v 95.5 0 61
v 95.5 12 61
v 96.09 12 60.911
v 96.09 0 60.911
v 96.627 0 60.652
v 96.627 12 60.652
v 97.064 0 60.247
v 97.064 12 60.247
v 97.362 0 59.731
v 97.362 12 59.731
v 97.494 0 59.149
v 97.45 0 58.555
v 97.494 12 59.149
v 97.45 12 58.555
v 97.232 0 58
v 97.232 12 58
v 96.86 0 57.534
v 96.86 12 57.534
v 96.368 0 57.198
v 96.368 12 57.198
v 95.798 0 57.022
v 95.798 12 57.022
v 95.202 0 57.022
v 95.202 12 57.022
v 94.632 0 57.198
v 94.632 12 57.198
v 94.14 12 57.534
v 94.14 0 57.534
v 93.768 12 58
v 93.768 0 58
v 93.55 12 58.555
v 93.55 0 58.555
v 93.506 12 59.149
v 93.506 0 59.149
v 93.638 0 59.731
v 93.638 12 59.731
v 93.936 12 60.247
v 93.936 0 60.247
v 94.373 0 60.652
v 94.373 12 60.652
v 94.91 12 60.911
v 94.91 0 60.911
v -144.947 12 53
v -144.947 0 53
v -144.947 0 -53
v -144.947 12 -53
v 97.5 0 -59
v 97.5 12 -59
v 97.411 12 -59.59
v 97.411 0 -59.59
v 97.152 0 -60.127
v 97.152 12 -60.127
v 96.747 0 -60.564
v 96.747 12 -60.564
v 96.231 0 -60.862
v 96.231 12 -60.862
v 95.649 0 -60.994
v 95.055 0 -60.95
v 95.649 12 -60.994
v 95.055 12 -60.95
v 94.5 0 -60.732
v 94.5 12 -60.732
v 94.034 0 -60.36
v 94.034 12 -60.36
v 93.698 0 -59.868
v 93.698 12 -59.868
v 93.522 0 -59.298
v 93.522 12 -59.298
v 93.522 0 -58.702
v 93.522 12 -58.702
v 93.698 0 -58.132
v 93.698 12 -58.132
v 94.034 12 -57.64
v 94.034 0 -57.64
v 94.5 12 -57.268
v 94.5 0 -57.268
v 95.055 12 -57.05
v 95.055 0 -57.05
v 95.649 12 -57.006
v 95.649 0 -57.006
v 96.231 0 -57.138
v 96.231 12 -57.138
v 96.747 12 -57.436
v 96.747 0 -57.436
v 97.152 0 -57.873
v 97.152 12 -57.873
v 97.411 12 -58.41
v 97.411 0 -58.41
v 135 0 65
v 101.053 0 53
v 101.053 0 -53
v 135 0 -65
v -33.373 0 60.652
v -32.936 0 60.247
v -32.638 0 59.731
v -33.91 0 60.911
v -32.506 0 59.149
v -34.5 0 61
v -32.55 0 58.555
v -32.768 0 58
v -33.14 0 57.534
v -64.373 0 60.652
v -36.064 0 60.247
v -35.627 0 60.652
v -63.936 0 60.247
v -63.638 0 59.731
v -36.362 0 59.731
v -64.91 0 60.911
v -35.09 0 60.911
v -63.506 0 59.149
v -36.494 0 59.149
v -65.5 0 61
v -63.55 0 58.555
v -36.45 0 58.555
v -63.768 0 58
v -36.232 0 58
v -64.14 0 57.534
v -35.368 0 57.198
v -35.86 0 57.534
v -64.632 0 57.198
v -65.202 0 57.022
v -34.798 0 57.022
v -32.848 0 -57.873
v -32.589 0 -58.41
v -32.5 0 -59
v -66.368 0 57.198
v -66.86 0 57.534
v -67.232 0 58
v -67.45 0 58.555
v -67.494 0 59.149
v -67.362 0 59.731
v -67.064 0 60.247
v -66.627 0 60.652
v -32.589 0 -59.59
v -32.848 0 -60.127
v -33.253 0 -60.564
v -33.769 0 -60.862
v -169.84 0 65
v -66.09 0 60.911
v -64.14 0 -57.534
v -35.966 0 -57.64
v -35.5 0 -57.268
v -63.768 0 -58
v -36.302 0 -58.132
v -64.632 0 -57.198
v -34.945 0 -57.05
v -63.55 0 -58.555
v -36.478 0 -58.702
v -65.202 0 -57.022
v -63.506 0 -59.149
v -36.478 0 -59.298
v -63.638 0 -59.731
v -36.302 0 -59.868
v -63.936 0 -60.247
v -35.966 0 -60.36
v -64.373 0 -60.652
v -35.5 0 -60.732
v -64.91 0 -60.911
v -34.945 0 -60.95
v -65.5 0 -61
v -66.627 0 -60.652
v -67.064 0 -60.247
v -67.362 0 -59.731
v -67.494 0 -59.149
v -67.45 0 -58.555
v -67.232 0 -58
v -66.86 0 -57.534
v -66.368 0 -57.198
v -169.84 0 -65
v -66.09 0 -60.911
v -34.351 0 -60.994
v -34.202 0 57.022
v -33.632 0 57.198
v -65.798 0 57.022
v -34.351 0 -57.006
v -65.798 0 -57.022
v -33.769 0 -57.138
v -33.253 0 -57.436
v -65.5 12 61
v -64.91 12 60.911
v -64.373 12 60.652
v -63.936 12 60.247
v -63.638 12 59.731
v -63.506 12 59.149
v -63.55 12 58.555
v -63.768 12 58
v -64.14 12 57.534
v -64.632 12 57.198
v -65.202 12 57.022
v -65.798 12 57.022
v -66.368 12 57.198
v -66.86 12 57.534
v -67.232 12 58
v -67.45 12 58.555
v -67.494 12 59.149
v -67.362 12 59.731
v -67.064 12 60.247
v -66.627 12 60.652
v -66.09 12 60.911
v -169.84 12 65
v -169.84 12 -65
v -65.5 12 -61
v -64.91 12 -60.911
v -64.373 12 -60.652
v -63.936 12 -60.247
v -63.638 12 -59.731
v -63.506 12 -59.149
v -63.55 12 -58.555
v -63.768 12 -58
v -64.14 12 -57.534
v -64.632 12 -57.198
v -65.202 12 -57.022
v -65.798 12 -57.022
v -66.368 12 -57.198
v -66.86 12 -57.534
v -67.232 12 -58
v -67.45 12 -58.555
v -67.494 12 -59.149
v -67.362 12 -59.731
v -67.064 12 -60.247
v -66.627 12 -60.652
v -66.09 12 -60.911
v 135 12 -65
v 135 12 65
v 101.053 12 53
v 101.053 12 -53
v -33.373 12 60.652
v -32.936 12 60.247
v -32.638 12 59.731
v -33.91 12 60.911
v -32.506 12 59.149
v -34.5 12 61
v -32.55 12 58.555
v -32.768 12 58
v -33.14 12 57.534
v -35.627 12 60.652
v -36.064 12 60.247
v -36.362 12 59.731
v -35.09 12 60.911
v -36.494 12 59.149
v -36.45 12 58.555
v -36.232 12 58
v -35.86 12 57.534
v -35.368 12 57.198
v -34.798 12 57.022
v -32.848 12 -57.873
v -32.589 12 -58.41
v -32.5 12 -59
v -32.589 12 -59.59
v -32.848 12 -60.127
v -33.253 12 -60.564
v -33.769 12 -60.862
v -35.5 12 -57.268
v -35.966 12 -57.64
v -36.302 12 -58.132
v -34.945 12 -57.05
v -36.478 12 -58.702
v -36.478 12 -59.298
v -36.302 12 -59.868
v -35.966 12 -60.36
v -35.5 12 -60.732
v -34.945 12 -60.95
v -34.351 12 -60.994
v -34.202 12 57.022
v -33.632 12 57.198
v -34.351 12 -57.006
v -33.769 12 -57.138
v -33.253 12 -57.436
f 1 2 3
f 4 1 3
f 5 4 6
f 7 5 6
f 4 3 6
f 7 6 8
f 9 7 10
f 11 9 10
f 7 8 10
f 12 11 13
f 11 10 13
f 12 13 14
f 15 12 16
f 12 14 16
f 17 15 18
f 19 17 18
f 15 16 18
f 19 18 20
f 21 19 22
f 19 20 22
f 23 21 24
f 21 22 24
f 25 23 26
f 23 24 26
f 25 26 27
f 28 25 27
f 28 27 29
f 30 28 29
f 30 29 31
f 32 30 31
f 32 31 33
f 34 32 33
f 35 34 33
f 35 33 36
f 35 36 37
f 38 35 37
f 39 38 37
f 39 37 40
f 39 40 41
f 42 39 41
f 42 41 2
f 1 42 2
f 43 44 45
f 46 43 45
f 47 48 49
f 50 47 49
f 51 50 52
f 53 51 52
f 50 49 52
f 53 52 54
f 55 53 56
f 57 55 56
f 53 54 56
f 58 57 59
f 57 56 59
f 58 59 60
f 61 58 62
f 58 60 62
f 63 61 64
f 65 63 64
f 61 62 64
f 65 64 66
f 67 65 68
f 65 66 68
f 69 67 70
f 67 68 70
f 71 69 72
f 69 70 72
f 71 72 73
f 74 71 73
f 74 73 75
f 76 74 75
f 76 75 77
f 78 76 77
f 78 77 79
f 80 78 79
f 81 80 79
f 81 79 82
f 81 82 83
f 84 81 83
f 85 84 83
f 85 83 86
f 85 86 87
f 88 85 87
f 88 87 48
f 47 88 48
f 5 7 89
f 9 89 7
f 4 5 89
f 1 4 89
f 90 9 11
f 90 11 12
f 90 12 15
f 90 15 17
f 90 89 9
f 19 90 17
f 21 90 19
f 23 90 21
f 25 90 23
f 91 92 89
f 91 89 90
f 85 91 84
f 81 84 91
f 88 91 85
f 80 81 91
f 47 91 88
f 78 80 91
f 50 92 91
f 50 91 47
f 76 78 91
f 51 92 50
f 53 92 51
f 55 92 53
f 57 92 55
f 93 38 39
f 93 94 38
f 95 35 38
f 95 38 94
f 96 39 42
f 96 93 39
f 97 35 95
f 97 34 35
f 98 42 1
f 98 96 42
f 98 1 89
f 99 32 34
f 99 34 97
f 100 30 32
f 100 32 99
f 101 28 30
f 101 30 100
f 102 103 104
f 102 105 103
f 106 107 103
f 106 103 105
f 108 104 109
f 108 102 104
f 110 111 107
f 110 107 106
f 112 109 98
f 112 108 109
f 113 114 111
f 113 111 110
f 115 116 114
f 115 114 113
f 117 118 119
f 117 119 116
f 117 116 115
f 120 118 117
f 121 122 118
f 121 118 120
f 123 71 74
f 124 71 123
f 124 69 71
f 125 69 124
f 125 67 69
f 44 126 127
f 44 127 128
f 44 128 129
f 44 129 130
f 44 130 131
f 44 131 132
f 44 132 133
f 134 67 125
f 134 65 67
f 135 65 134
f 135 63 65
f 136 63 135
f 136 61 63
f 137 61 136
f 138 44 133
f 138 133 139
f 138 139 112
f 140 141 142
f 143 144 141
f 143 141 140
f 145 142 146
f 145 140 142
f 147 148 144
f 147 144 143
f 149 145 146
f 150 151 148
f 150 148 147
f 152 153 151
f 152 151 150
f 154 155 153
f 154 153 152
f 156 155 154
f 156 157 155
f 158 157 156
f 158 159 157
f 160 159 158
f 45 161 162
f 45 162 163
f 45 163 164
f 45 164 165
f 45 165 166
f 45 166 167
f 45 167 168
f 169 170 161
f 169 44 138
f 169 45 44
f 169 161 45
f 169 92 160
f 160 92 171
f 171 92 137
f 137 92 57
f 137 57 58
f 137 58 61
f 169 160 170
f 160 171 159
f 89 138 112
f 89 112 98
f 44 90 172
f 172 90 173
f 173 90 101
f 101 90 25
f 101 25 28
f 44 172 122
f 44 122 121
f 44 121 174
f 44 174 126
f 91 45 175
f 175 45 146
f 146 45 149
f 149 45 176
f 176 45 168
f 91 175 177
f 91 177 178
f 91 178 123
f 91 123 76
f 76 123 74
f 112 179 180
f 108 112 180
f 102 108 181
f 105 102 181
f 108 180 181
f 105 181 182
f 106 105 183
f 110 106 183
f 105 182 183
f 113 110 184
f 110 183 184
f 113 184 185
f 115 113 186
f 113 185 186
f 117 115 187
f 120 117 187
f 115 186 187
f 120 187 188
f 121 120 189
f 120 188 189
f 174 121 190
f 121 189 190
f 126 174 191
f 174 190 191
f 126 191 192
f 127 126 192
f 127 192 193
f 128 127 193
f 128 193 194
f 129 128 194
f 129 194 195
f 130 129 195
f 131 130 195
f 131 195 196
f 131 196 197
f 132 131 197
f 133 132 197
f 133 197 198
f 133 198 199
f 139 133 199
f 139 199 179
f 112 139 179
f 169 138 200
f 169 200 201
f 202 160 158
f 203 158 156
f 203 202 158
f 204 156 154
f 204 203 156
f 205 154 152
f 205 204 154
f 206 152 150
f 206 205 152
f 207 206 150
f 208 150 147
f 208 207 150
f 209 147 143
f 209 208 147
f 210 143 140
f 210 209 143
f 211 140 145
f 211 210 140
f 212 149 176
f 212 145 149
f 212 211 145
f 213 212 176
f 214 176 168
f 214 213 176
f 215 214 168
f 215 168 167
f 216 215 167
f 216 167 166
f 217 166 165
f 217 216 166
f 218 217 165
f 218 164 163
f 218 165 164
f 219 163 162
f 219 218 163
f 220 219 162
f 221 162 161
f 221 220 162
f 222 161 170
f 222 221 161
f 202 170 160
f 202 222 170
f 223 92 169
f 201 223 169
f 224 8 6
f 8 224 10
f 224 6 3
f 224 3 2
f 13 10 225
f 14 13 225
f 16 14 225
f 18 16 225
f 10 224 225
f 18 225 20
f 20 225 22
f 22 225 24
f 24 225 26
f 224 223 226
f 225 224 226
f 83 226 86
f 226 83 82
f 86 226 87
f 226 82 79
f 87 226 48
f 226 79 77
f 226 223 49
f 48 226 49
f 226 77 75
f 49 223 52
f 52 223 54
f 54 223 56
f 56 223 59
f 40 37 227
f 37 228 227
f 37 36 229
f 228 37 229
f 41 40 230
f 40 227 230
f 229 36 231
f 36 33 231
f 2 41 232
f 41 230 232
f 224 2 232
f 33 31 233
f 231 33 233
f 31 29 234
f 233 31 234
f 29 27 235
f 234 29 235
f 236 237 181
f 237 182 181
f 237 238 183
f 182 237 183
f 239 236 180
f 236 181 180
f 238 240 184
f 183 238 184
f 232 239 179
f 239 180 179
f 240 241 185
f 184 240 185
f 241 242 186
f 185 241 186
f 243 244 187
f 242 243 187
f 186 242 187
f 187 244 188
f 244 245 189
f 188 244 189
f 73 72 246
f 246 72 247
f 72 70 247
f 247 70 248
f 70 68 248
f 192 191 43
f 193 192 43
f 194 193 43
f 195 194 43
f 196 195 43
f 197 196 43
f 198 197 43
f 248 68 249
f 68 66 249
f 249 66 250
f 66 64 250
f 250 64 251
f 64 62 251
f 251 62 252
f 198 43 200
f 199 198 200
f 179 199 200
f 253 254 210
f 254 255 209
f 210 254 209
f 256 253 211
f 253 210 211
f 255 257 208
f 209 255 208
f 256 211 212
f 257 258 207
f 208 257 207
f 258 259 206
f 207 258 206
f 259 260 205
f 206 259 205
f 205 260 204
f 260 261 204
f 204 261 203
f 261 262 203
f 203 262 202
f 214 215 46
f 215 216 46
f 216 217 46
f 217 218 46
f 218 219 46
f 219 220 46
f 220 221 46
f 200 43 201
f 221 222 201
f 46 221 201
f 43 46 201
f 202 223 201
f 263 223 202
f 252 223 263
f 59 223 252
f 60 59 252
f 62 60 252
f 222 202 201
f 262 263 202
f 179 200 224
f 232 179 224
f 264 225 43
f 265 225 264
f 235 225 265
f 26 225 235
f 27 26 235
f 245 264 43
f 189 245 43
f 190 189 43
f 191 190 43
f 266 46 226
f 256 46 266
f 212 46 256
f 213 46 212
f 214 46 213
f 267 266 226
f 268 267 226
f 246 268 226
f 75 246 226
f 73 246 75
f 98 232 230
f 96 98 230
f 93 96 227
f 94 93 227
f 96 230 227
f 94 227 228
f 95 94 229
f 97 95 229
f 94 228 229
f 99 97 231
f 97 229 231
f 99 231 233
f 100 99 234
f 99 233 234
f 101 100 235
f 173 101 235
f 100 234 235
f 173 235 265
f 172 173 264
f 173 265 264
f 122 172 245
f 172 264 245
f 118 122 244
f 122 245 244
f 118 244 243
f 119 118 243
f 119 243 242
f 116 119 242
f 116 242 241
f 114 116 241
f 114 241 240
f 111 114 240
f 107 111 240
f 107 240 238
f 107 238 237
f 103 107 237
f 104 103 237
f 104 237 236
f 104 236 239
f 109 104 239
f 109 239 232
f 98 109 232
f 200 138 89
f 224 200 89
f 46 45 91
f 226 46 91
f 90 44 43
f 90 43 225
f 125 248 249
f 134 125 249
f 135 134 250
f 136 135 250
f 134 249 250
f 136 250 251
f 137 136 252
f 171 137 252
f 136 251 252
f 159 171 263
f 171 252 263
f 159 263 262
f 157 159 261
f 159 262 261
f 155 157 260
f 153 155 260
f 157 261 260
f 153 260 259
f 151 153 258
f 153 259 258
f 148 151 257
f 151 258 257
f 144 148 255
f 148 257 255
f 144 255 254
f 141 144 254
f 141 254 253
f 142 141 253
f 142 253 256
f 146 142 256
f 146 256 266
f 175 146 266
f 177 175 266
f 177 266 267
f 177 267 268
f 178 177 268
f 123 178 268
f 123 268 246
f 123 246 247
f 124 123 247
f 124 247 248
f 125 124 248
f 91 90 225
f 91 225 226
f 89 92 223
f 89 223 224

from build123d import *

# Parameters (mm, degrees)
SKETCH1_W                 = 246
SKETCH1_H                 = 106
BOSS_EXTRUDE1_DEPTH       = 12
SKETCH3_R                 = 2
CUT_EXTRUDE1_DEPTH        = 50.25
LPATTERN1_COUNT           = 2
LPATTERN1_PITCH           = 31
LPATTERN1_COPY_1_SKETCH_R = 2
LPATTERN1_COPY_1_DEPTH    = 50.25
LPATTERN2_COUNT           = 2
LPATTERN2_PITCH           = 161
MIRROR2_COPY_1_SKETCH_R   = 2
MIRROR2_COPY_1_DEPTH      = 50.25
MIRROR2_COPY_2_SKETCH_R   = 2
MIRROR2_COPY_2_DEPTH      = 50.25


with BuildPart() as part:
    # Sketch1 → Boss-Extrude1 (new body)
    with BuildSketch(Plane(origin=(0, 0, 0), x_dir=(1, 0, 0), z_dir=(0, 1, 0))):
        Polygon((-135, 65), (135, 65), (135, -65), (-135, -65), (-169.840376894, -65), (-169.840376894, 65), align=None)
        with Locations((-21.947414212, 0)):
            Rectangle(SKETCH1_W, SKETCH1_H, mode=Mode.SUBTRACT)
    extrude(amount=BOSS_EXTRUDE1_DEPTH)

    # Sketch3 → Cut-Extrude1 (cut)
    with BuildSketch(Plane(origin=(0, 12, 0), x_dir=(1, 0, 0), z_dir=(0, 1, 0))):
        with Locations(Location((-65.5, -59, 0), (0, 0, 270))):
            Circle(SKETCH3_R)
    cut_extrude1 = extrude(amount=-CUT_EXTRUDE1_DEPTH, mode=Mode.SUBTRACT)

    # Mirror1: Cut-Extrude1 across plane
    add(cut_extrude1.mirror(Plane.XY), mode=Mode.SUBTRACT)

    # LPattern1: Cut-Extrude1 ×2
    with Locations(*[(i * LPATTERN1_PITCH, 0, 0) for i in range(1, LPATTERN1_COUNT)]):
        add(cut_extrude1, mode=Mode.SUBTRACT)

    # LPattern1 copy 1 sketch → LPattern1 copy 1 (cut)
    with BuildSketch(Plane(origin=(31, 12, 0), x_dir=(1, 0, 0), z_dir=(0, 1, 0))):
        with Locations((-65.5, 59)):
            Circle(LPATTERN1_COPY_1_SKETCH_R)
    extrude(amount=-LPATTERN1_COPY_1_DEPTH, mode=Mode.SUBTRACT)

    # LPattern2: Cut-Extrude1 ×2
    with Locations(*[(i * LPATTERN2_PITCH, 0, 0) for i in range(1, LPATTERN2_COUNT)]):
        add(cut_extrude1, mode=Mode.SUBTRACT)

    # Mirror2 copy 1 sketch → Mirror2 copy 1 (cut)
    with BuildSketch(Plane(origin=(161, 12, 0), x_dir=(1, 0, 0), z_dir=(0, 1, 0))):
        with Locations((-65.5, 59)):
            Circle(MIRROR2_COPY_1_SKETCH_R)
    extrude(amount=-MIRROR2_COPY_1_DEPTH, mode=Mode.SUBTRACT)

    # Mirror2 copy 2 sketch → Mirror2 copy 2 (cut)
    with BuildSketch(Plane(origin=(0, 12, 0), x_dir=(1, 0, 0), z_dir=(0, 1, 0))):
        with Locations((-65.5, 59)):
            Circle(MIRROR2_COPY_2_SKETCH_R)
    extrude(amount=-MIRROR2_COPY_2_DEPTH, mode=Mode.SUBTRACT)


solid = part.part
